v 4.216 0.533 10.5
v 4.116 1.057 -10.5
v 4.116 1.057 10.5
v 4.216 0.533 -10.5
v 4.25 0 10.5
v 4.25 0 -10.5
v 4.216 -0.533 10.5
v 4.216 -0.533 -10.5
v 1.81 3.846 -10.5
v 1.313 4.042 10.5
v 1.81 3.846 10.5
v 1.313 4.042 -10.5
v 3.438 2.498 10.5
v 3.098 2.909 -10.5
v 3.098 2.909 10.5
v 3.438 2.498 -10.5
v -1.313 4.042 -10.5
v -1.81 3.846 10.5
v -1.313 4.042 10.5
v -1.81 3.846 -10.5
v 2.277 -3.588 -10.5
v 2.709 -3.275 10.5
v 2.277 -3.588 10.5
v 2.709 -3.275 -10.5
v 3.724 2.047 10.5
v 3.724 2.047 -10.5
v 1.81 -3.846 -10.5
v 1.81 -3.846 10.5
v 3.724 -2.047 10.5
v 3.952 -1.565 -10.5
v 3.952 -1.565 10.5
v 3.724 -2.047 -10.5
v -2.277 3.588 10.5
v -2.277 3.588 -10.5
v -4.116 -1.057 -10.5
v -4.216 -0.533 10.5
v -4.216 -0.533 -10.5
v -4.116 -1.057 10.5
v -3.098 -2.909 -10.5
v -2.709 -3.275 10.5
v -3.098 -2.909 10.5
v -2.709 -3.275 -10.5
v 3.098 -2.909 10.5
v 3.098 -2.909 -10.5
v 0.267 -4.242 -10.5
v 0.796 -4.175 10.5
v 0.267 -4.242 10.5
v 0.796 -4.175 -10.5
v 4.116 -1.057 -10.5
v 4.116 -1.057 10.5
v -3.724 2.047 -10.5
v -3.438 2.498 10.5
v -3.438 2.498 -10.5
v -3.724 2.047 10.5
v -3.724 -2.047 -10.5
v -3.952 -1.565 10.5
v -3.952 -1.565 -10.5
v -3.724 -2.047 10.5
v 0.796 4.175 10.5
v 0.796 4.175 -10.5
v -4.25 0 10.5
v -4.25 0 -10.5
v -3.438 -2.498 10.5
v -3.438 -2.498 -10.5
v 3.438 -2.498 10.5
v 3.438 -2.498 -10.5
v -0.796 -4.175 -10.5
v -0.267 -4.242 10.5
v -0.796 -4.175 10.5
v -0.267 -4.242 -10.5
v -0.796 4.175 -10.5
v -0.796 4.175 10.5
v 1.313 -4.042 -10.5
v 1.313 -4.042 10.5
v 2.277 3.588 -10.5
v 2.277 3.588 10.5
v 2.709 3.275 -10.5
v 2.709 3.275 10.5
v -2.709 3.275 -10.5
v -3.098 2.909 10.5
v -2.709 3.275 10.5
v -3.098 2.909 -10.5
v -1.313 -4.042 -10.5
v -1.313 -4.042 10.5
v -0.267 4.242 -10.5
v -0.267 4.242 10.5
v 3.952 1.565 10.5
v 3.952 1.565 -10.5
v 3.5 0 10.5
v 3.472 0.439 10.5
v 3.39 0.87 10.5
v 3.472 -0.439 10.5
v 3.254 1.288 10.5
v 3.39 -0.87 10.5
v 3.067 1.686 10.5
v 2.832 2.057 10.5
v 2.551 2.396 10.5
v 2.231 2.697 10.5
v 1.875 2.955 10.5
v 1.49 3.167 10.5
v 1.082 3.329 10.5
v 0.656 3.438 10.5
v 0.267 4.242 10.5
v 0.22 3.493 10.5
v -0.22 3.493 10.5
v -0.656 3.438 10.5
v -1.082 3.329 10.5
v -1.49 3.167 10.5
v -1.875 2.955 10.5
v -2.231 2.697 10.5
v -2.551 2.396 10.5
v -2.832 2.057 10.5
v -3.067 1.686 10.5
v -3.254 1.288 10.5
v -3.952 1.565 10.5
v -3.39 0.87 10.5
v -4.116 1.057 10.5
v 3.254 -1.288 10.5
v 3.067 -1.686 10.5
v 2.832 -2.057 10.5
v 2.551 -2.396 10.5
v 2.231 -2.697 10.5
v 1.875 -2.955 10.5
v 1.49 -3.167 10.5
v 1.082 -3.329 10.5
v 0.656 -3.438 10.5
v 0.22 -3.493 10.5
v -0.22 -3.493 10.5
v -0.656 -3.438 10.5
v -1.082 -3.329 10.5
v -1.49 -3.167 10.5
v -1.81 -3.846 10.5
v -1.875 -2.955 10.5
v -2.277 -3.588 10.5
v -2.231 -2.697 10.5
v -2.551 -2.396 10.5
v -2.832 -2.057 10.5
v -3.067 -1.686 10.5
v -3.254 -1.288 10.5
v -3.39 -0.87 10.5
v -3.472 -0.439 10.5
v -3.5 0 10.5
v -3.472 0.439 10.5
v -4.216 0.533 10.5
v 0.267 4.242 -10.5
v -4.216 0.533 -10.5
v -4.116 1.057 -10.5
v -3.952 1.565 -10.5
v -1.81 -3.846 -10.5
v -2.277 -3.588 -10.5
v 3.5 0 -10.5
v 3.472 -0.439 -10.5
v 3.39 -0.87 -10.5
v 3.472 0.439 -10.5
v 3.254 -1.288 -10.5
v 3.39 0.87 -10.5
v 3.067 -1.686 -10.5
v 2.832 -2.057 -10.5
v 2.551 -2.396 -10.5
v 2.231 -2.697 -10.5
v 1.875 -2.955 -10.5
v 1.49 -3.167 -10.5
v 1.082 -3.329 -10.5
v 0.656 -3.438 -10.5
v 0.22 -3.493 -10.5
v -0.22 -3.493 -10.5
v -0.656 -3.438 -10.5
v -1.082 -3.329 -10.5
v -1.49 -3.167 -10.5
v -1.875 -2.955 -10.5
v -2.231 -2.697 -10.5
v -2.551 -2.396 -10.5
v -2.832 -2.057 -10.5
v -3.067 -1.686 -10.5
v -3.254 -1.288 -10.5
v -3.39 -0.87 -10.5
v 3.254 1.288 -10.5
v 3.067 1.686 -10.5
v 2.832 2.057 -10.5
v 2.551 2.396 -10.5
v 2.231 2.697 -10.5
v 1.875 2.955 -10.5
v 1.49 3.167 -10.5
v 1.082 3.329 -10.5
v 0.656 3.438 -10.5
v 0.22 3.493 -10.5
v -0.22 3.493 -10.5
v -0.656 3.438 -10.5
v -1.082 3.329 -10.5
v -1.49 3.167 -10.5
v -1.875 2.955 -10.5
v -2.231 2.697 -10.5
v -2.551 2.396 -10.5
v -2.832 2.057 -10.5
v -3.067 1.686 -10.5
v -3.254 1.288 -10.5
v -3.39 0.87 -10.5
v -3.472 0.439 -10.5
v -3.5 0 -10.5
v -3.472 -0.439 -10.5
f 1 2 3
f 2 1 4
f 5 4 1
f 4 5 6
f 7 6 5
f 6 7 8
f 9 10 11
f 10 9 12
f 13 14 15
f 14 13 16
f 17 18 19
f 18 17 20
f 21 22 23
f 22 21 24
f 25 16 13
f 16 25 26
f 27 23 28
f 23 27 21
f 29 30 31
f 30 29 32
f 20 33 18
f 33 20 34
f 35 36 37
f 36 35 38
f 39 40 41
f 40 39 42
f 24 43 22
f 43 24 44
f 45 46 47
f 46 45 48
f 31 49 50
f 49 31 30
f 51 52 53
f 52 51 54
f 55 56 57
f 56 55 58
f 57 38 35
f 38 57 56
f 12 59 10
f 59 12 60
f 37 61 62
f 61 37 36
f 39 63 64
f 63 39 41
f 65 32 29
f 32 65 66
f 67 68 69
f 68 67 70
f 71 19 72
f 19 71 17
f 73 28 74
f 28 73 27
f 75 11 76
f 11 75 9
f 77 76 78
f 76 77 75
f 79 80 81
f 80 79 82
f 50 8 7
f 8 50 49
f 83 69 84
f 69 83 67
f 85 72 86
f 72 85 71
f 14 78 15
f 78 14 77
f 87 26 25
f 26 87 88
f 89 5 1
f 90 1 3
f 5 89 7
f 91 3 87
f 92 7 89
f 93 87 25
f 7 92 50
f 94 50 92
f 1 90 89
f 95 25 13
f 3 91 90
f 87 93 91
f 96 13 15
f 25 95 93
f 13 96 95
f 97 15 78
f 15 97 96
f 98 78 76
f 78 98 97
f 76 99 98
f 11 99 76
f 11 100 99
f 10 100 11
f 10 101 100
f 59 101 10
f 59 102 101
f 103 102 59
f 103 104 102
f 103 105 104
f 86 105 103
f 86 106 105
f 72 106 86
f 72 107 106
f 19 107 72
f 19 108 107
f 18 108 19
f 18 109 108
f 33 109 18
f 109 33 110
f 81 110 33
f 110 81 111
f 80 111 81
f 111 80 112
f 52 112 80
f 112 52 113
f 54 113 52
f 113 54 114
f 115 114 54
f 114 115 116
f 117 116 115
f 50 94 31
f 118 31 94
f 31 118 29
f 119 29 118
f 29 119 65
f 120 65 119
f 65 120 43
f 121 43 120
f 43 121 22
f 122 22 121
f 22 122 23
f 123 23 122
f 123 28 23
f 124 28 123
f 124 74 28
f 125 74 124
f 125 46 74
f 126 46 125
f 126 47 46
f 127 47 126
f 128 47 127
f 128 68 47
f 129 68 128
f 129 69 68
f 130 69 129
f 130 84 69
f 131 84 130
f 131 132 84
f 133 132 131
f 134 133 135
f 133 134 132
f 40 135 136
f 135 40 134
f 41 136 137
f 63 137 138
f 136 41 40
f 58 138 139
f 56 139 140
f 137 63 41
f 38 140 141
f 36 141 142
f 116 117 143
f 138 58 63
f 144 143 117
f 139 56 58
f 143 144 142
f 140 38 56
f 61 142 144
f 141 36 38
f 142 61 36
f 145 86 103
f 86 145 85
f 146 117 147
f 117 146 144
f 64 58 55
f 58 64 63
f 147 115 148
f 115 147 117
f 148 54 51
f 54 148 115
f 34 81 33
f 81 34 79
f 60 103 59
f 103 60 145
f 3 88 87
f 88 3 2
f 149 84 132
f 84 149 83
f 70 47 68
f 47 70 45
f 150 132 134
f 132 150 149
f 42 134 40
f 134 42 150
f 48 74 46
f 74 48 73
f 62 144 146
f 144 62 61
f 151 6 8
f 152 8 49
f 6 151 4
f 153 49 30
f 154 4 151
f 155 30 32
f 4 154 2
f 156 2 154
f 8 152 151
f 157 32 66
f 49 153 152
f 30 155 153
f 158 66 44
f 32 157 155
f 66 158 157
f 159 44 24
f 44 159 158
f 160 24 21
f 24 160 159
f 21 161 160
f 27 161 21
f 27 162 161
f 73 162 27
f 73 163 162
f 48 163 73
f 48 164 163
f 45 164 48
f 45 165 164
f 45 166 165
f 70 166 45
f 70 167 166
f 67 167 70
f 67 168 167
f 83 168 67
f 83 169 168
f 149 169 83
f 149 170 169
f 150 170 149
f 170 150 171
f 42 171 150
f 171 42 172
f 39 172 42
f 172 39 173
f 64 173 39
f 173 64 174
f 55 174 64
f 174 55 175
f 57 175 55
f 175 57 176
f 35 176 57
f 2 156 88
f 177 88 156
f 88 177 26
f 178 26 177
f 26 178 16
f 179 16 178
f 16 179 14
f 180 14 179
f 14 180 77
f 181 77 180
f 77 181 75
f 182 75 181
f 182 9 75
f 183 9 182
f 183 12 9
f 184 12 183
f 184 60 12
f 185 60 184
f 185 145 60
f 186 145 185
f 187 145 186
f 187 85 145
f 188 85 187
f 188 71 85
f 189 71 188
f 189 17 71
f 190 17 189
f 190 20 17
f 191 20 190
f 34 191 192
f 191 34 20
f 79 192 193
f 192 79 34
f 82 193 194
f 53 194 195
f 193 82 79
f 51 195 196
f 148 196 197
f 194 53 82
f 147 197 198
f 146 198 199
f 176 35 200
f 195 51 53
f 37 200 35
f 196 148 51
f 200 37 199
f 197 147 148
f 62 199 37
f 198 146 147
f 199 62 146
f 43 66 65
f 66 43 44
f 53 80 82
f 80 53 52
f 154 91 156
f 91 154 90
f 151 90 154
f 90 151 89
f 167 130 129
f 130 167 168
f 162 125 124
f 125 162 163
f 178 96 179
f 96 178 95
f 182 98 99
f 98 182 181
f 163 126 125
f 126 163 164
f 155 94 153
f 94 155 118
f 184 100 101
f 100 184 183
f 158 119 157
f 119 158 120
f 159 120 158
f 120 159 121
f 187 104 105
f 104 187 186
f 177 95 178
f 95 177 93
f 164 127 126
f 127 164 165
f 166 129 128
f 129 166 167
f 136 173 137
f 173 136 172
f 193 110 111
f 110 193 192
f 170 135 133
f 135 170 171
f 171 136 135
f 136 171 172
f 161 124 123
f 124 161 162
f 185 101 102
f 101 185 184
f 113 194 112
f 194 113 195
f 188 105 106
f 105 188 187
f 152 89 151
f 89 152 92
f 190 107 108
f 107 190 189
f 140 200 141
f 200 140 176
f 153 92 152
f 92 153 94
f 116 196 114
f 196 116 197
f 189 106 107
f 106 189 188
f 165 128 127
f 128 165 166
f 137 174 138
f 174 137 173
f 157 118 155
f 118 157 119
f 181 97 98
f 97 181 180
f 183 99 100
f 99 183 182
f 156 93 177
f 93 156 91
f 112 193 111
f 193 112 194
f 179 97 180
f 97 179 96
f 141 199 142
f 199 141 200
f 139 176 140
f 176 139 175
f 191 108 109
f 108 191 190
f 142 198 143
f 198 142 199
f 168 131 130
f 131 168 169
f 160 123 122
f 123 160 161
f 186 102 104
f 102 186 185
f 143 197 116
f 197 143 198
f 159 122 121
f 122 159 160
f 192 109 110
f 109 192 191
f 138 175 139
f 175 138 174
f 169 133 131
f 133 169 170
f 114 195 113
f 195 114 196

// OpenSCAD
$fn = 50;


difference() {
	union() {
		translate(v = [0, 0, -10.5000000000]) {
			cylinder(h = 21, r = 4.2500000000);
		}
	}
	union() {
		translate(v = [0, 0, -100.0000000000]) {
			cylinder(h = 200, r = 3.5000000000);
		}
	}
}
